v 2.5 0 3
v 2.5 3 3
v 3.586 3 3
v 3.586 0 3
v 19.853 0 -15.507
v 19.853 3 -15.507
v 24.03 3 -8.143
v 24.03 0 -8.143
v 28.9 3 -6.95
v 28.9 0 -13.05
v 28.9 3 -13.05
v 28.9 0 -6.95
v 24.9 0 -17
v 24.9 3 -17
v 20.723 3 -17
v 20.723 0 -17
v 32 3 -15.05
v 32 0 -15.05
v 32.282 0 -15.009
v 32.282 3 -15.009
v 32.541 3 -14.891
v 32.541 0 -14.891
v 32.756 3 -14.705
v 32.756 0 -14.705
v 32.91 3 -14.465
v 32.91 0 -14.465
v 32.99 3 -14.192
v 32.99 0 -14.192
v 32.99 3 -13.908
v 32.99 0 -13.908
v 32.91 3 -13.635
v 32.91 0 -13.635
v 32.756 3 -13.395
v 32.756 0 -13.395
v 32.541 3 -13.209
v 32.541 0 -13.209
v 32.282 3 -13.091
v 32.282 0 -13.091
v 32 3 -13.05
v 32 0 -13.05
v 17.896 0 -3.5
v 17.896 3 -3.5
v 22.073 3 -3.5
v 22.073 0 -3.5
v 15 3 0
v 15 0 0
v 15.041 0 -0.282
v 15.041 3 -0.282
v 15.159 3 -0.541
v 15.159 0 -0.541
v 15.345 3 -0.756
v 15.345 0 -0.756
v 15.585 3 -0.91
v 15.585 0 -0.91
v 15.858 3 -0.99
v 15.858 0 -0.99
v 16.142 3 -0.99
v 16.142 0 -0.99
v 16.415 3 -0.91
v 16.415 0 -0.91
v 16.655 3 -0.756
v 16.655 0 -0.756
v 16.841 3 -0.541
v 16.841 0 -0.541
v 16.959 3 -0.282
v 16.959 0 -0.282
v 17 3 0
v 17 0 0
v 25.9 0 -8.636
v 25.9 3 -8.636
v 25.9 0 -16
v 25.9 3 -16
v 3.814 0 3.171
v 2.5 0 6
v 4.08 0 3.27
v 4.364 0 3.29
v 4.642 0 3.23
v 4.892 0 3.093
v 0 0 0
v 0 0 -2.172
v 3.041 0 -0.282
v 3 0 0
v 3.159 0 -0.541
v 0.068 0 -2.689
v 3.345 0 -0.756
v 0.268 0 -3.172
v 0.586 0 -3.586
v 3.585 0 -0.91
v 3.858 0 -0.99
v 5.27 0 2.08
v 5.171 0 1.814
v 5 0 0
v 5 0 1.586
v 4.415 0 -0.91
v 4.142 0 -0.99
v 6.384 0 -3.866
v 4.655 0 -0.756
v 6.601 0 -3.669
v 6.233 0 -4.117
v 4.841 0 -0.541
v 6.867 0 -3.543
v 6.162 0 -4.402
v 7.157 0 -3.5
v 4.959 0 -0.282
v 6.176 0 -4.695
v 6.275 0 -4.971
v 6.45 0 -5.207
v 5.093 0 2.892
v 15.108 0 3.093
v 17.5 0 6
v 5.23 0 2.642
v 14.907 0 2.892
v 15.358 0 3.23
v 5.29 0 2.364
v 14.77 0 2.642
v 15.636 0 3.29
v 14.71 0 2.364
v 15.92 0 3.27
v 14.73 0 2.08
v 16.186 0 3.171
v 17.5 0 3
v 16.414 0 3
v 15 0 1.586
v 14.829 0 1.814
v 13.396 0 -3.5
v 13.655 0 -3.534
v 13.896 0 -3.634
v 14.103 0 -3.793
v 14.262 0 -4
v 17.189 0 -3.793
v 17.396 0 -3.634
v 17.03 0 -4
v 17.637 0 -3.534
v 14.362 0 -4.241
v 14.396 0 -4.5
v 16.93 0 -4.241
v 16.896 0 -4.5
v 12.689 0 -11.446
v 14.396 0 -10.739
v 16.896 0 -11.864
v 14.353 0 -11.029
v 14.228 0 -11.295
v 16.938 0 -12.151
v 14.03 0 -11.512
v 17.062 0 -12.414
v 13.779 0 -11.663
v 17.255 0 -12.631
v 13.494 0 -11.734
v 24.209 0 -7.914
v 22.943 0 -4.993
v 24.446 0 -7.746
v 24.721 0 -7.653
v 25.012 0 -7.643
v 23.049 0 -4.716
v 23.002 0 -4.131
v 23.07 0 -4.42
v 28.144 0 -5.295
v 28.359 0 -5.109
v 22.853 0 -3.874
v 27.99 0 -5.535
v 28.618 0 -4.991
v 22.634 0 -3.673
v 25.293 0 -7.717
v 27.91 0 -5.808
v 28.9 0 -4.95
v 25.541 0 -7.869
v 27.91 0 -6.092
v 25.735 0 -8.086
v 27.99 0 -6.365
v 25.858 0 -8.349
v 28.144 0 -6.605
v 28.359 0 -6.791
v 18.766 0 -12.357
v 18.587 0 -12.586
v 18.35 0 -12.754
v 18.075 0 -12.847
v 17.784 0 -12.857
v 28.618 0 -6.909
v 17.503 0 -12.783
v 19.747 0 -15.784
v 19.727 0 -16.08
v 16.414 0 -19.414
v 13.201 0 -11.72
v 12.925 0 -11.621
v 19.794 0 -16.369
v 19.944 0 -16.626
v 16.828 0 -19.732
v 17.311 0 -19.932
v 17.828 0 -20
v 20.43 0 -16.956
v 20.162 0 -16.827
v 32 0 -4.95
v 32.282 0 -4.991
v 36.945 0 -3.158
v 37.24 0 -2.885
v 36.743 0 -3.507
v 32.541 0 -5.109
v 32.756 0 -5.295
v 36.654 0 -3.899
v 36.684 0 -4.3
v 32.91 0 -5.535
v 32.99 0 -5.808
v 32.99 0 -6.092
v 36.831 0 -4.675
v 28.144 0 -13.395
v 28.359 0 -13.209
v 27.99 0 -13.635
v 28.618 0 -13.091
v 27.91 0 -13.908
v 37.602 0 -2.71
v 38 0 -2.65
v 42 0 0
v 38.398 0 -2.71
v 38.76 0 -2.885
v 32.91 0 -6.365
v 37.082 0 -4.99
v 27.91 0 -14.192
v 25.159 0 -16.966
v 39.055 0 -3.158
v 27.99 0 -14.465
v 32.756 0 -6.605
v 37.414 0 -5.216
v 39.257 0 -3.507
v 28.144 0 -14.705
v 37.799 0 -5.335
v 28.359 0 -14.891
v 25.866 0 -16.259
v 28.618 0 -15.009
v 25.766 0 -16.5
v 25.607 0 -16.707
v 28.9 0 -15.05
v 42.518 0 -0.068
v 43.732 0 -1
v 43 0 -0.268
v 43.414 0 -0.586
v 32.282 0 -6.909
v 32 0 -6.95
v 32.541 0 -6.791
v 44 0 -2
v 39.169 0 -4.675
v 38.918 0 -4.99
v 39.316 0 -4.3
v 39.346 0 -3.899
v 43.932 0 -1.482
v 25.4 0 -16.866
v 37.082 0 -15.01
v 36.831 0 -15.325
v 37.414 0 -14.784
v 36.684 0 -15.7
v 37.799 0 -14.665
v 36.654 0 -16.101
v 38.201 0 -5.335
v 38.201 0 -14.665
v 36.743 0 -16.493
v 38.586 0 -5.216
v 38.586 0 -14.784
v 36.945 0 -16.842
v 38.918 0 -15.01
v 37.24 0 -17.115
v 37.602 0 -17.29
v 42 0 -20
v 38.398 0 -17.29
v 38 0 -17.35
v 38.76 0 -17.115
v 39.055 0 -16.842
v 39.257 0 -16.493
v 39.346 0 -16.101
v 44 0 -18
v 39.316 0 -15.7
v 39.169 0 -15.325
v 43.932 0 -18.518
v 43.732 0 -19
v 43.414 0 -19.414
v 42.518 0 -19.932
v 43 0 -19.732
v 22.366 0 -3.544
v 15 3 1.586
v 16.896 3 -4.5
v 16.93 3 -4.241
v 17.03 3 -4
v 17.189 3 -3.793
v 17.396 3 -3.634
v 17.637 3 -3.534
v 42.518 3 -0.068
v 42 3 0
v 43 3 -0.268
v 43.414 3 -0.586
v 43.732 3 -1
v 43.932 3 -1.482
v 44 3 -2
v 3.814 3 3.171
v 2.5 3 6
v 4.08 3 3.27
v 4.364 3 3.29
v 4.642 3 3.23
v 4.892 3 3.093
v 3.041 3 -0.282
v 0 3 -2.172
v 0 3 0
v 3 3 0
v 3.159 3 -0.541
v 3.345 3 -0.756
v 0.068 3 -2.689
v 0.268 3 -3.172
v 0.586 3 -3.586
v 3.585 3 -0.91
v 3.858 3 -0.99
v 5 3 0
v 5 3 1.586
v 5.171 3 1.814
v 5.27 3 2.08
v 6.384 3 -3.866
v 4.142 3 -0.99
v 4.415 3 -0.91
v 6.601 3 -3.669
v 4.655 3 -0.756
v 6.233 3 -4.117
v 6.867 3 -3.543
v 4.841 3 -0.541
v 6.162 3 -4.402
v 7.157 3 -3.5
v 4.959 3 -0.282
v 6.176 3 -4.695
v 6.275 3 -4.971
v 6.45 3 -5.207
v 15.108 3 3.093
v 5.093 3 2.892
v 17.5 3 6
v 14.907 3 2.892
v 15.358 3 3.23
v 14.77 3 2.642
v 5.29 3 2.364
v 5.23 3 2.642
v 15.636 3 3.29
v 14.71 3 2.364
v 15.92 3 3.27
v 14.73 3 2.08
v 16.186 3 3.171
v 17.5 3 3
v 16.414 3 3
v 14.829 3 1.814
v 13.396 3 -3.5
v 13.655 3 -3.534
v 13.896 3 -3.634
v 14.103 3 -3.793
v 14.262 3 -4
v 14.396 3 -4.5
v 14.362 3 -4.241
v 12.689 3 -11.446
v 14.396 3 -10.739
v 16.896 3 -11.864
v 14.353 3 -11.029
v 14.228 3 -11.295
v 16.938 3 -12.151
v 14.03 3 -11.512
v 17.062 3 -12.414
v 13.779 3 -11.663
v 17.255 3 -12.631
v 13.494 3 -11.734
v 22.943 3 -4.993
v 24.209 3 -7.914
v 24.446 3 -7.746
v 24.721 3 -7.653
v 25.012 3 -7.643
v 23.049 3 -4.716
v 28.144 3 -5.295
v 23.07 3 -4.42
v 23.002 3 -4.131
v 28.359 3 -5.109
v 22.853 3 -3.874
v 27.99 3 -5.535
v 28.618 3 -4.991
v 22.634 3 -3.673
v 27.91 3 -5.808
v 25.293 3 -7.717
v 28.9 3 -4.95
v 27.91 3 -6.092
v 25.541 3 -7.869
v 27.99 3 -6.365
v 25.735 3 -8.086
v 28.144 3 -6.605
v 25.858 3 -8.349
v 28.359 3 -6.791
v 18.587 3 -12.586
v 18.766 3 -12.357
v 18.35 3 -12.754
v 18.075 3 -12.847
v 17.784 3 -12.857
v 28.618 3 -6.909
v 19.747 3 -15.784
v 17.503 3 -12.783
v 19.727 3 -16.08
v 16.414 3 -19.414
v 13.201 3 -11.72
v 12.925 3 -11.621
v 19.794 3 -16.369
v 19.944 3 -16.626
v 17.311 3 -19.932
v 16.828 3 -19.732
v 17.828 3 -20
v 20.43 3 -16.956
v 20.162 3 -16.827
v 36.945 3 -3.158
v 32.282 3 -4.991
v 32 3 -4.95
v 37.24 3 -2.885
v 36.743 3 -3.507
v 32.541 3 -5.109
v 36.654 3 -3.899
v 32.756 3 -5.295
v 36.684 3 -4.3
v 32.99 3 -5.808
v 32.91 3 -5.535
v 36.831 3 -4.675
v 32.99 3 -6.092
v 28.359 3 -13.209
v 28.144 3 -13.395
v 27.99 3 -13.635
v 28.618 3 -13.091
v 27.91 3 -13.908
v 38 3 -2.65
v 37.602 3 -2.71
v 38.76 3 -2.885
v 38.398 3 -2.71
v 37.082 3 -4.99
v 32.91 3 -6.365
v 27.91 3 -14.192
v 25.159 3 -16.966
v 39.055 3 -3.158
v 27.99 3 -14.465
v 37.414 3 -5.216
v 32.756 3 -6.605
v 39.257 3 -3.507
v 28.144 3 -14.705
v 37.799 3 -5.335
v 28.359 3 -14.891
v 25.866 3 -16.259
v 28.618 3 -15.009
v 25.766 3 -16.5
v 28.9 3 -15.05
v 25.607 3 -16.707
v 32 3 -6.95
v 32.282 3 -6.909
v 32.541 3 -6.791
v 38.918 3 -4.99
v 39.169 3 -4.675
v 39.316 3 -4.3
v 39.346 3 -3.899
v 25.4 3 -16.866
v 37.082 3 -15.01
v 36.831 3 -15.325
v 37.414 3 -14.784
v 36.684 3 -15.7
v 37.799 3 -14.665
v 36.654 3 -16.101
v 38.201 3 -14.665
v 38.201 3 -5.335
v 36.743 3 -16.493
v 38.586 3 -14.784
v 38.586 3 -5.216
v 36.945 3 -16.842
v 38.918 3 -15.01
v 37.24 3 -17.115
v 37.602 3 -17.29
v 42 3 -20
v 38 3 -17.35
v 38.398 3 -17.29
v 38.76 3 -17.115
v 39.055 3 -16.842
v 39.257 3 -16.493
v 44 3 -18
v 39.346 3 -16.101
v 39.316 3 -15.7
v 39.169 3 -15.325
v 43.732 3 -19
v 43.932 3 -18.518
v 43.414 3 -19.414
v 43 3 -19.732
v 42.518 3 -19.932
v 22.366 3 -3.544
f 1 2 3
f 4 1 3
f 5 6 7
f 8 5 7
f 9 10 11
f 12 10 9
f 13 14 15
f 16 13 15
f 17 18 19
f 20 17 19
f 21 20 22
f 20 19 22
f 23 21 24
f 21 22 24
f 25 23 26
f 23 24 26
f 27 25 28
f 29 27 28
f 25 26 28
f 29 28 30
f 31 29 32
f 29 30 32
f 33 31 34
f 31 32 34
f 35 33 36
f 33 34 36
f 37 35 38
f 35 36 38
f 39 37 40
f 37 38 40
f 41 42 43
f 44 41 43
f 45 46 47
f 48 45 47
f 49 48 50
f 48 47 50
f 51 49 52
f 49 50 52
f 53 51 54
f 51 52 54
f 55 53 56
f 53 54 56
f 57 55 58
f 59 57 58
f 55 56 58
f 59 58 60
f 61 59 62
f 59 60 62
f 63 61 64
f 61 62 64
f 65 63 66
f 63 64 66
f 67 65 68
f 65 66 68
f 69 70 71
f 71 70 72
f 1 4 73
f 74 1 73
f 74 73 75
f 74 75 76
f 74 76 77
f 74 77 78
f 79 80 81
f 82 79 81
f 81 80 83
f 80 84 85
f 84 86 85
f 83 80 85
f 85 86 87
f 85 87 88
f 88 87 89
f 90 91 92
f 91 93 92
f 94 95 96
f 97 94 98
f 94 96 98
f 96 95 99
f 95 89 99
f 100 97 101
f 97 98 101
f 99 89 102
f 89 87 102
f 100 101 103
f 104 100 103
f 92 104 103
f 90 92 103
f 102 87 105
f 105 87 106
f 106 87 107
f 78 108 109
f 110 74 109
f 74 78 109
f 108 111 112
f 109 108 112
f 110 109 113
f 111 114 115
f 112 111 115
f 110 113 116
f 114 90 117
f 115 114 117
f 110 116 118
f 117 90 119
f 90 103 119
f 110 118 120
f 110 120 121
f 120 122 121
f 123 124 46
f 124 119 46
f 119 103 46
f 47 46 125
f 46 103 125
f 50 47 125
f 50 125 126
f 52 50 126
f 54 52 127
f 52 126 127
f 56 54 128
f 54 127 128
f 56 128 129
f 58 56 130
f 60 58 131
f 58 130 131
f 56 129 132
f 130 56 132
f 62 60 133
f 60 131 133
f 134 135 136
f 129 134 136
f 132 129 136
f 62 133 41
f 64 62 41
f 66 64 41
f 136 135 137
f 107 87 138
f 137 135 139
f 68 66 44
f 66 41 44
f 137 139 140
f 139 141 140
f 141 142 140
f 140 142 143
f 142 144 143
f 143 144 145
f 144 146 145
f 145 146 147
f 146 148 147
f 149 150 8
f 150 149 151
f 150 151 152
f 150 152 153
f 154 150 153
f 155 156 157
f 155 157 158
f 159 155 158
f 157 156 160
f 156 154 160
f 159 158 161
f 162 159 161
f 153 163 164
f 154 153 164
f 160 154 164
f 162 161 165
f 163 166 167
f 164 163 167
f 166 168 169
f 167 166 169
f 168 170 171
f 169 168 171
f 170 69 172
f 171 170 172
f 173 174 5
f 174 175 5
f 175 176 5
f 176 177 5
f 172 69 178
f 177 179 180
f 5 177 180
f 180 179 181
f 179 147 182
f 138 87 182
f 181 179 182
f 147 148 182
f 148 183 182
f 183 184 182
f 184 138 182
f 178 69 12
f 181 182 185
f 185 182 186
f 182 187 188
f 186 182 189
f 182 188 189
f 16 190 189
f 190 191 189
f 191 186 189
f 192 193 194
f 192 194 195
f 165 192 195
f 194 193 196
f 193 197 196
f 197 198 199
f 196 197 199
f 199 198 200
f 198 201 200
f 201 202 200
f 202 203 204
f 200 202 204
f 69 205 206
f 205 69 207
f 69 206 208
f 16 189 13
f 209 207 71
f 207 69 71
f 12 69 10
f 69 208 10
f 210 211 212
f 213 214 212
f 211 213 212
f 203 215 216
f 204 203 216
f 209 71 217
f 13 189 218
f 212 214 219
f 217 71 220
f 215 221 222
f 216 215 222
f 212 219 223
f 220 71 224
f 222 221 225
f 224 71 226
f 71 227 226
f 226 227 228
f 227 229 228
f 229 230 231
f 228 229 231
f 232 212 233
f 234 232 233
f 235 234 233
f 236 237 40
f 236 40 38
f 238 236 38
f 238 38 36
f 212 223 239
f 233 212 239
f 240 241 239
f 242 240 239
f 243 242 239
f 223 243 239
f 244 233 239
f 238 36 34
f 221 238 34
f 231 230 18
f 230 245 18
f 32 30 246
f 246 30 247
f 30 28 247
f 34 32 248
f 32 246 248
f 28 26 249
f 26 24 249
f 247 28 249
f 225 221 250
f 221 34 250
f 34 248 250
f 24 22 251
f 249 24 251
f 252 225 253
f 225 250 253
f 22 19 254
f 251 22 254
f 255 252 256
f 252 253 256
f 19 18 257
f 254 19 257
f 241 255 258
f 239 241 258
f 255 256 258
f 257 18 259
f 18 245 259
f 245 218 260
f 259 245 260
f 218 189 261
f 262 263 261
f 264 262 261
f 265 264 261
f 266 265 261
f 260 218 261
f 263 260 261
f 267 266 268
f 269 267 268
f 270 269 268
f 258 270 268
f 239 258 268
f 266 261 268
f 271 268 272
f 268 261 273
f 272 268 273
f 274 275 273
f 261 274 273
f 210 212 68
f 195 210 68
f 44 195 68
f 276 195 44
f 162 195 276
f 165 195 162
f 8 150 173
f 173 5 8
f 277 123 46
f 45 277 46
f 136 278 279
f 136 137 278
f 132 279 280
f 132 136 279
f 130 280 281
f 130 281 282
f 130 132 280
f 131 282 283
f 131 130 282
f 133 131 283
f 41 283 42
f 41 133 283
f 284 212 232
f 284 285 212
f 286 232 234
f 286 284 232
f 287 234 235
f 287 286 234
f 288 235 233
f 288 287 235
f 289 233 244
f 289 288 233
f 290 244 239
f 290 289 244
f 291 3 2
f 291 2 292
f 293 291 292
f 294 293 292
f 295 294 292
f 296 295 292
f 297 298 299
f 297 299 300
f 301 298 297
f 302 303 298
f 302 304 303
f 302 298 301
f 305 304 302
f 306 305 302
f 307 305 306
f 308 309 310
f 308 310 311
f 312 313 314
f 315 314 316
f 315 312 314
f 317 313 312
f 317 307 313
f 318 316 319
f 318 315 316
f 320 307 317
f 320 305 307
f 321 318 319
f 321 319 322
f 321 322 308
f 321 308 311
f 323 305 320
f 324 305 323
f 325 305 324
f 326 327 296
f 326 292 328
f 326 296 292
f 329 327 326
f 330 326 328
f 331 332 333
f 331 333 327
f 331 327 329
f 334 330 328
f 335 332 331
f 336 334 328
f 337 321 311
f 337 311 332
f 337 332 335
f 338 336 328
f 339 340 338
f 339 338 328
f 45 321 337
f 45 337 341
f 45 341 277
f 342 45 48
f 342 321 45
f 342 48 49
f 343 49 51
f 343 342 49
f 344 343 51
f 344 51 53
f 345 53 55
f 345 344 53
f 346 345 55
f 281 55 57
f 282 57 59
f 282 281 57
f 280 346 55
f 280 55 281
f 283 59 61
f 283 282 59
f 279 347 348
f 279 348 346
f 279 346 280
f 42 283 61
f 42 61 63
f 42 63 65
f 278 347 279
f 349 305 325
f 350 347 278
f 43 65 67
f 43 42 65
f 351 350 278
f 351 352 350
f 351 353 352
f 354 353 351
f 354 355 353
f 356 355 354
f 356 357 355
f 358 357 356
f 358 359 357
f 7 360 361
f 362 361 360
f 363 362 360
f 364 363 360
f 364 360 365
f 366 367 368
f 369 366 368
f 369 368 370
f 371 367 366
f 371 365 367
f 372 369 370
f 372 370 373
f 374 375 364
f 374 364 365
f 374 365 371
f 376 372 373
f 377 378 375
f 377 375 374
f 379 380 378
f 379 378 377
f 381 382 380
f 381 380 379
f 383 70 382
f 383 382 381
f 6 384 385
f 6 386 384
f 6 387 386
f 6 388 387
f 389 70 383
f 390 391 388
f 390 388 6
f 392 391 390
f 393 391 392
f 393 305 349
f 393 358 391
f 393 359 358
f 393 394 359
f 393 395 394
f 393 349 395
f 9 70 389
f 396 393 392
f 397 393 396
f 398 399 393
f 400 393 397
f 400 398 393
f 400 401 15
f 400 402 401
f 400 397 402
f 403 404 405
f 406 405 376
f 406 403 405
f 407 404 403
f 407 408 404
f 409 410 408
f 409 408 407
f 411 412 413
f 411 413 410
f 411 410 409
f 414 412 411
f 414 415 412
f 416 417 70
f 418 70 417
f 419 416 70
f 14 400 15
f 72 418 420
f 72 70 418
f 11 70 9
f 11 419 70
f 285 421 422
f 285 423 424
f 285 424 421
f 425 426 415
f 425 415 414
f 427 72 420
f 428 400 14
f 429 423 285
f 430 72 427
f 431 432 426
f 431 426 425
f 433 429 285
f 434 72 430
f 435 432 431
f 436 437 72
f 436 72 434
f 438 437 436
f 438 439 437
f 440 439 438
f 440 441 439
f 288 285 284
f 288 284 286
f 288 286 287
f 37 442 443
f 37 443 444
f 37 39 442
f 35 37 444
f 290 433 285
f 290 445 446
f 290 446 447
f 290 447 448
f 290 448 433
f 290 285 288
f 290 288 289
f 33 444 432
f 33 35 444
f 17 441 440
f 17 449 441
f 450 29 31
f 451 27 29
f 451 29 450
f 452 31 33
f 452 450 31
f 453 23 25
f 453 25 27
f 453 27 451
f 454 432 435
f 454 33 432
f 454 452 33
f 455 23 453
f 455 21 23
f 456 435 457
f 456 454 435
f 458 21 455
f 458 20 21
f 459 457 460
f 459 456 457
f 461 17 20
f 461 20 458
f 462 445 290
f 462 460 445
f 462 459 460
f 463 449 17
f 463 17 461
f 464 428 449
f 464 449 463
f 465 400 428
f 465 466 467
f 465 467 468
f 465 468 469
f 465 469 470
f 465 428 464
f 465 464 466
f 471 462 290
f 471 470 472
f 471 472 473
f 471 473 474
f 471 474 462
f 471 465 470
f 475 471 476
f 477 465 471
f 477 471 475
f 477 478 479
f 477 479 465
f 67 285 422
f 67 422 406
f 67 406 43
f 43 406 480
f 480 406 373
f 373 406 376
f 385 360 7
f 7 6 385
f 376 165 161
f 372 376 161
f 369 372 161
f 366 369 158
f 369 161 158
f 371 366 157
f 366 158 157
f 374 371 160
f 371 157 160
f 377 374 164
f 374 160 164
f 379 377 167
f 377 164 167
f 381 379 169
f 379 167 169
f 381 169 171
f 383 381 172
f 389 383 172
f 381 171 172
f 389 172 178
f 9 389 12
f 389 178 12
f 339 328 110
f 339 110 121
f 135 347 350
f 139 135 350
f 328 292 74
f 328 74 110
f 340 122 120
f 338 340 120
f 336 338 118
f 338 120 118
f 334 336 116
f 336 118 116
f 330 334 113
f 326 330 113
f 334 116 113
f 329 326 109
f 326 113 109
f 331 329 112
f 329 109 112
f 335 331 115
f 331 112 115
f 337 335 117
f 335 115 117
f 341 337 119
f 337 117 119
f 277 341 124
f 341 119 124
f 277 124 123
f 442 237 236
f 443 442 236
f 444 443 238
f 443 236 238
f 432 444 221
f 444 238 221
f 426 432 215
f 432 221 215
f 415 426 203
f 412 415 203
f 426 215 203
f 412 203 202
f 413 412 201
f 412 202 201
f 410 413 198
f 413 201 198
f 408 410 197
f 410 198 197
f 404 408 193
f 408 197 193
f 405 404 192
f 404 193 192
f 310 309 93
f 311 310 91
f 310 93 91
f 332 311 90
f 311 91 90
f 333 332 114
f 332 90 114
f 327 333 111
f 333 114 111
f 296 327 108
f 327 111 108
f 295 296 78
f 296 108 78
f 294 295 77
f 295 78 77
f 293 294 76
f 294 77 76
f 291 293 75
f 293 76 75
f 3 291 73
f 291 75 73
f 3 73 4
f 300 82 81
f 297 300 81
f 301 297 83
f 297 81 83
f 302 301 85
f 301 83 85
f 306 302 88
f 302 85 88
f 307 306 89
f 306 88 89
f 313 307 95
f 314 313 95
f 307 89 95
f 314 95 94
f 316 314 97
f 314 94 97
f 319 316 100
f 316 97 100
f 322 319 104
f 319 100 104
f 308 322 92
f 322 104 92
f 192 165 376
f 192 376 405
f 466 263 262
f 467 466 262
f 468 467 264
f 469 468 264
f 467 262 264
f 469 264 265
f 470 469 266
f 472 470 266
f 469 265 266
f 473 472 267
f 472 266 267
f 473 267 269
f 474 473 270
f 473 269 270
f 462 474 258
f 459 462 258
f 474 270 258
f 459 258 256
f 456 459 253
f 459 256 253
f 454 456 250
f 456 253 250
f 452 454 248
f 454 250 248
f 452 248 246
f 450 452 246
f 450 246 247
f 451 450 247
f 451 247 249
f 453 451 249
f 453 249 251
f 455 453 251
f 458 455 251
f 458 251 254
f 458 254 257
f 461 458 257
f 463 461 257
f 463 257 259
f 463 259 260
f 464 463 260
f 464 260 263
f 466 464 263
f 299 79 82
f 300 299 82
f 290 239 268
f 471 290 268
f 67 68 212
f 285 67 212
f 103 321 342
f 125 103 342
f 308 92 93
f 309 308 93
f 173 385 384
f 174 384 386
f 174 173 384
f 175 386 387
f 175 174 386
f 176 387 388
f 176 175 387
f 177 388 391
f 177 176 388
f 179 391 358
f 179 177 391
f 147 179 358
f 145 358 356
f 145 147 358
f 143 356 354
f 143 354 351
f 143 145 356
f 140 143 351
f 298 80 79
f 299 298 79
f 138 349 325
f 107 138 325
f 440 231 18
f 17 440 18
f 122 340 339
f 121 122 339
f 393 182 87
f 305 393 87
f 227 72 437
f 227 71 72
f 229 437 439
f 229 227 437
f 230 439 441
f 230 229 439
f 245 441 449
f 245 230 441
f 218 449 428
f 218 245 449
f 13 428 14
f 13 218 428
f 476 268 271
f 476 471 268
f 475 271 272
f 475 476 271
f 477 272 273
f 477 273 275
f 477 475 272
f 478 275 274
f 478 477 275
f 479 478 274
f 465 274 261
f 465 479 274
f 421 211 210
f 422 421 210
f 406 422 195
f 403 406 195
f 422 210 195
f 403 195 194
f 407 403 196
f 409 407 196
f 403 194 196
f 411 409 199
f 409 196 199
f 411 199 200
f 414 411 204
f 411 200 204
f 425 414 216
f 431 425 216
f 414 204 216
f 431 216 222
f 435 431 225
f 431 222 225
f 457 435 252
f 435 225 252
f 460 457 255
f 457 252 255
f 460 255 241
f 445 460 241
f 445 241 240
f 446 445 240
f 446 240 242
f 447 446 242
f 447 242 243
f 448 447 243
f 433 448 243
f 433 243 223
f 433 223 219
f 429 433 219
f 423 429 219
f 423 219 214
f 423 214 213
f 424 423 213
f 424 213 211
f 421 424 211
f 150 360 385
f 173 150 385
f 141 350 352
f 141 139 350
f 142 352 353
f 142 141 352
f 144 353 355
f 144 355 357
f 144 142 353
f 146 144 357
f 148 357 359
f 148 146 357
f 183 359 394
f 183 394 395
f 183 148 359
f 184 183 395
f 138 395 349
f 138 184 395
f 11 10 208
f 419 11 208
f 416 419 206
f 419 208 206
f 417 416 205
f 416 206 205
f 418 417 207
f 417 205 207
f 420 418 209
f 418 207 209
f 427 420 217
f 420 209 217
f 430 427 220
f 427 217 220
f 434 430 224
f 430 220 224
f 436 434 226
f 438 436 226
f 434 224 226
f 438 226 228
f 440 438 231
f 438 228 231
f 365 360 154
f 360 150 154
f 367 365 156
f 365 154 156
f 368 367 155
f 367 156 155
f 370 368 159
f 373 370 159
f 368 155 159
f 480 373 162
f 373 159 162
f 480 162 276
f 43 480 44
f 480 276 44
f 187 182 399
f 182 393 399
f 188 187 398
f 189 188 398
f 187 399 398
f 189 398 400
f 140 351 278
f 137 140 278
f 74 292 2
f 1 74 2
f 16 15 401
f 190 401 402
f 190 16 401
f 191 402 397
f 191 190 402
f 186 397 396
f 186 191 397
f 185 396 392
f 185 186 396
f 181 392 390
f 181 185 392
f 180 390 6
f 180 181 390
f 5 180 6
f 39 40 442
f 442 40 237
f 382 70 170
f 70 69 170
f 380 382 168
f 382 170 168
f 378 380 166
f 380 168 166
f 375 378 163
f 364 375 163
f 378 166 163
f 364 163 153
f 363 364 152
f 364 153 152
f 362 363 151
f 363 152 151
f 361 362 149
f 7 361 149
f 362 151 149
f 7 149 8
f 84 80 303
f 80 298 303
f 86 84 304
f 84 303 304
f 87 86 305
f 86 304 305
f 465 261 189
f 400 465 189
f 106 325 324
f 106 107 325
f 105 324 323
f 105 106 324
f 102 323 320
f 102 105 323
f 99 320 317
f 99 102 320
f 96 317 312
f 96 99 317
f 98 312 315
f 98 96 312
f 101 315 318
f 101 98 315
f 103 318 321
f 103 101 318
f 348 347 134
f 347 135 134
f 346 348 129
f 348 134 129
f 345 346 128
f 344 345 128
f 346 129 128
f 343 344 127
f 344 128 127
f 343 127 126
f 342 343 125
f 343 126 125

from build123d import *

# Parameters (mm, degrees)
EXTRUDE_1_DEPTH     = 3
SKETCH_2_R          = 1.35
SKETCH_2_W          = 3.1
SKETCH_2_H          = 10.1
CUT_EXTRUDE_1_DEPTH = 49.425200051
SKETCH_5_W          = 15
SKETCH_5_H          = 3
EXTRUDE_2_DEPTH     = 3
SKETCH_3_R          = 1
CUT_EXTRUDE_2_DEPTH = 49.425200051
CUT_EXTRUDE_3_DEPTH = 10
FILLET_1_R          = 1
FILLET_2_R          = 2


with BuildPart() as part:
    # 草图1 → 凸台-拉伸1 (new body)
    with BuildSketch(Plane(origin=(0, 0, 0), x_dir=(1, 0, 0), z_dir=(0, 1, 0))):
        Polygon((0, 0), (5, 0), (5, -3), (15, -3), (15, 0), (44, 0), (44, 20), (17, 20), (0, 3), align=None)
    extrude(amount=EXTRUDE_1_DEPTH)

    # 草图2 → 切除-拉伸1 (cut, through all)
    with BuildSketch(Plane.XZ):
        with Locations(Location((38, -16, 0), (0, 0, 270))):
            Circle(SKETCH_2_R)
        with Locations(Location((38, -4, 0), (0, 0, 90))):
            Circle(SKETCH_2_R)
        with Locations((30.45, -10)):
            Rectangle(SKETCH_2_W, SKETCH_2_H)
    extrude(amount=-CUT_EXTRUDE_1_DEPTH, mode=Mode.SUBTRACT)

    # 草图5 → 凸台-拉伸2 (add)
    with BuildSketch(Plane(origin=(0, 3, 0), x_dir=(1, 0, 0), z_dir=(0, 1, 0))):
        with Locations((10, -4.5)):
            Rectangle(SKETCH_5_W, SKETCH_5_H)
    extrude(amount=-EXTRUDE_2_DEPTH)

    # 草图3 → 切除-拉伸2 (cut, through all)
    with BuildSketch(Plane.XZ):
        with Locations((32, -14.05)):
            Circle(SKETCH_3_R)
        with Locations((16, 0)):
            Circle(SKETCH_3_R)
        with Locations((4, 0)):
            Circle(SKETCH_3_R)
        with Locations((32, -5.95)):
            Circle(SKETCH_3_R)
        with Locations((28.9, -5.95)):
            Circle(SKETCH_3_R)
        with Locations((28.9, -14.05)):
            Circle(SKETCH_3_R)
        with Locations((4.292893219, 2.292893219)):
            Circle(SKETCH_3_R)
        with Locations((15.707106781, 2.292893219)):
            Circle(SKETCH_3_R)
    extrude(amount=-CUT_EXTRUDE_2_DEPTH, mode=Mode.SUBTRACT)

    # 草图4 → 切除-拉伸3 (cut)
    with BuildSketch(Plane(origin=(0, 3, 0), x_dir=(1, 0, 0), z_dir=(0, 1, 0))):
        Polygon((23.789631314, 3.5), (16.896065397, 15.65342471), (16.896065397, 3.5), align=None)
        Polygon((14.396065397, 3.5), (14.396065397, 13.15342471), (4.742640687, 3.5), align=None)
        Polygon((25.9, 4.84657529), (25.9, 17), (19.006434083, 17), align=None)
    extrude(amount=-CUT_EXTRUDE_3_DEPTH, mode=Mode.SUBTRACT)

    # 圆角1
    fillet_1_edges = [part.edges().sort_by_distance(p)[0] for p in [
        (19.006434083, 1.5, -17),
        (25.9, 1.5, -17),
        (25.9, 1.5, -4.84657529),
        (14.396065397, 1.5, -13.15342471),
        (14.396065397, 1.5, -3.5),
        (4.742640687, 1.5, -3.5),
        (16.896065397, 1.5, -15.65342471),
        (23.789631314, 1.5, -3.5),
        (16.896065397, 1.5, -3.5),
    ]]
    fillet(fillet_1_edges, radius=FILLET_1_R)

    # 圆角2
    fillet_2_edges = [part.edges().sort_by_distance(p)[0] for p in [
        (0, 1.5, -3),
        (17, 1.5, -20),
        (44, 1.5, -20),
        (44, 1.5, 0),
    ]]
    fillet(fillet_2_edges, radius=FILLET_2_R)


solid = part.part
